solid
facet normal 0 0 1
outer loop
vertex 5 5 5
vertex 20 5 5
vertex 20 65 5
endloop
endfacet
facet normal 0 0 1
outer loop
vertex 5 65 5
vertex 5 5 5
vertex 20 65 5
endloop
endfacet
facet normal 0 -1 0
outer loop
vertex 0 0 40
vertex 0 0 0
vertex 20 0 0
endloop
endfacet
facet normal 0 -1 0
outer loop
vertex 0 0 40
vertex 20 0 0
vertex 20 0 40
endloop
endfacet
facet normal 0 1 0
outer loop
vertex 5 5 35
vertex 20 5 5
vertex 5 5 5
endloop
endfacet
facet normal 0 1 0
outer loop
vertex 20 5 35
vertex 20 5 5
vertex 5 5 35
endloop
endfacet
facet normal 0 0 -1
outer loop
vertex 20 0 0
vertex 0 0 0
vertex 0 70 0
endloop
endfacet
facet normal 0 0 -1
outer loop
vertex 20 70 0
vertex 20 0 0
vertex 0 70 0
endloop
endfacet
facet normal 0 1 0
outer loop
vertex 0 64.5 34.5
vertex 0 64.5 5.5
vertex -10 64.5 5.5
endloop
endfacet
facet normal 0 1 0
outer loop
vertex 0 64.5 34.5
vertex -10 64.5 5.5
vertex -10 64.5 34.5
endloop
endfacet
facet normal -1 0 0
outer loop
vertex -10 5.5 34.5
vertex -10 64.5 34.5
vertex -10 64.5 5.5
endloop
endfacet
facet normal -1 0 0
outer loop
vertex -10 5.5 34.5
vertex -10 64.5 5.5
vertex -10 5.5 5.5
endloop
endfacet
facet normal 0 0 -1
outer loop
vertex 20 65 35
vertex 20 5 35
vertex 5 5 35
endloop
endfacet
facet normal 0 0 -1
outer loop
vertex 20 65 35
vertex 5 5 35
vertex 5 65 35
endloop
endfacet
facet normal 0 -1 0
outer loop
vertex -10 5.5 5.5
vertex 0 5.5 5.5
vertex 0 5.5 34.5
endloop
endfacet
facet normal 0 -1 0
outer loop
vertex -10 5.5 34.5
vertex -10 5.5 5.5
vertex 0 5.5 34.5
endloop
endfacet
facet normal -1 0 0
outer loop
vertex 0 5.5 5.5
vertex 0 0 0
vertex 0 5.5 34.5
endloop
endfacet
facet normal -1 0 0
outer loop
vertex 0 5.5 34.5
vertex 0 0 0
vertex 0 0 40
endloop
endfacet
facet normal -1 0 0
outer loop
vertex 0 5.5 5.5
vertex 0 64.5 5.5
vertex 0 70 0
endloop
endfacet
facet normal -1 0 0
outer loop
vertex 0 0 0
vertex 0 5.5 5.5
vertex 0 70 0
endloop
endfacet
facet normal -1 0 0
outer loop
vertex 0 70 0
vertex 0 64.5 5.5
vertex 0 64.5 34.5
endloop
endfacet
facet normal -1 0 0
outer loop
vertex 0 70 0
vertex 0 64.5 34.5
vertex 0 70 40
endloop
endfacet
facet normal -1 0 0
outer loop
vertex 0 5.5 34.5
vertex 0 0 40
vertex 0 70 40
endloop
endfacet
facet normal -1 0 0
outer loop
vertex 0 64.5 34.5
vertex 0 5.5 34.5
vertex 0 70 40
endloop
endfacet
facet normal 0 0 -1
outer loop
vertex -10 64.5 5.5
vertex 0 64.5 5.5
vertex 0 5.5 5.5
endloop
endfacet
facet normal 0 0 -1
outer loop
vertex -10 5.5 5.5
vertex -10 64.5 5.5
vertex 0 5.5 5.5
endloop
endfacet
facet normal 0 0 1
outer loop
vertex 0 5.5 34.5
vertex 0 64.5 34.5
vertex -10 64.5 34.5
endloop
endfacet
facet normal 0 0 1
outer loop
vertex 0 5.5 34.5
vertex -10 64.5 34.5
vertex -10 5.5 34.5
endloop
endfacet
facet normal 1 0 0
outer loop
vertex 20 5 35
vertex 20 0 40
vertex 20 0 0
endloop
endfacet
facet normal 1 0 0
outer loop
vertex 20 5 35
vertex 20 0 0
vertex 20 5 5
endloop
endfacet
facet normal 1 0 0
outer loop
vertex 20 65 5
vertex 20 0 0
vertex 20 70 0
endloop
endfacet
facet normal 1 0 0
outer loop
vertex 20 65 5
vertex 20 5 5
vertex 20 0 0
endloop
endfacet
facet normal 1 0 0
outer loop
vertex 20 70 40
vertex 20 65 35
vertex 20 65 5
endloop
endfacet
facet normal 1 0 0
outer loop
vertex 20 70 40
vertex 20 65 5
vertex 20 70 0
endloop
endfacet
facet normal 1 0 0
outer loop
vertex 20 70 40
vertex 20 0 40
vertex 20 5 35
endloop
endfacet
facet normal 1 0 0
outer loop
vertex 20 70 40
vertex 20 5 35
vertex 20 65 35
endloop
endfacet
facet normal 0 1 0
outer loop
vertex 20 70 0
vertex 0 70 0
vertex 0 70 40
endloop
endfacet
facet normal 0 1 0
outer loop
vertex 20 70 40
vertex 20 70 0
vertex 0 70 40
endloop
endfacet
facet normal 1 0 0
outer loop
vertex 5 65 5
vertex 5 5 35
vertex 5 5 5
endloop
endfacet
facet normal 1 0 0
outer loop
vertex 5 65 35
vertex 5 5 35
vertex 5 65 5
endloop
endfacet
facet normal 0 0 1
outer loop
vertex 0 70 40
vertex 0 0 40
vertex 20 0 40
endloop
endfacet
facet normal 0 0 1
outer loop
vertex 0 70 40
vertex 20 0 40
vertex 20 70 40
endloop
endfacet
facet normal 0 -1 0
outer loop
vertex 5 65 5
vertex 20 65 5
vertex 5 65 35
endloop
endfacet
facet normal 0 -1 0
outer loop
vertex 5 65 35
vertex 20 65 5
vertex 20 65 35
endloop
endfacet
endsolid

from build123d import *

# Parameters (mm, degrees)
F0_W     = 70
F0_H     = 40
F1_DEPTH = 20
F2_W     = 60
F2_H     = 30
F3_DEPTH = 15
F4_W     = 59
F4_H     = 29
F5_DEPTH = 10


with BuildPart() as f1:
    # F0 (on Right) → F1 (new body)
    with BuildSketch(Plane.YZ):
        with Locations((35, 20)):
            Rectangle(F0_W, F0_H)
    extrude(amount=F1_DEPTH)

    # F2 (on face) → F3 (cut)
    with BuildSketch(Plane.YZ.offset(20)):
        with Locations((35, 20)):
            Rectangle(F2_W, F2_H)
    extrude(amount=-F3_DEPTH, mode=Mode.SUBTRACT)

    # F4 (on face) → F5 (join)
    with BuildSketch(Plane(origin=(0, 0, 0), x_dir=(0, -1, 0), z_dir=(-1, 0, 0))):
        with Locations((-35, 20)):
            Rectangle(F4_W, F4_H)
    extrude(amount=F5_DEPTH)


solid = f1.part
